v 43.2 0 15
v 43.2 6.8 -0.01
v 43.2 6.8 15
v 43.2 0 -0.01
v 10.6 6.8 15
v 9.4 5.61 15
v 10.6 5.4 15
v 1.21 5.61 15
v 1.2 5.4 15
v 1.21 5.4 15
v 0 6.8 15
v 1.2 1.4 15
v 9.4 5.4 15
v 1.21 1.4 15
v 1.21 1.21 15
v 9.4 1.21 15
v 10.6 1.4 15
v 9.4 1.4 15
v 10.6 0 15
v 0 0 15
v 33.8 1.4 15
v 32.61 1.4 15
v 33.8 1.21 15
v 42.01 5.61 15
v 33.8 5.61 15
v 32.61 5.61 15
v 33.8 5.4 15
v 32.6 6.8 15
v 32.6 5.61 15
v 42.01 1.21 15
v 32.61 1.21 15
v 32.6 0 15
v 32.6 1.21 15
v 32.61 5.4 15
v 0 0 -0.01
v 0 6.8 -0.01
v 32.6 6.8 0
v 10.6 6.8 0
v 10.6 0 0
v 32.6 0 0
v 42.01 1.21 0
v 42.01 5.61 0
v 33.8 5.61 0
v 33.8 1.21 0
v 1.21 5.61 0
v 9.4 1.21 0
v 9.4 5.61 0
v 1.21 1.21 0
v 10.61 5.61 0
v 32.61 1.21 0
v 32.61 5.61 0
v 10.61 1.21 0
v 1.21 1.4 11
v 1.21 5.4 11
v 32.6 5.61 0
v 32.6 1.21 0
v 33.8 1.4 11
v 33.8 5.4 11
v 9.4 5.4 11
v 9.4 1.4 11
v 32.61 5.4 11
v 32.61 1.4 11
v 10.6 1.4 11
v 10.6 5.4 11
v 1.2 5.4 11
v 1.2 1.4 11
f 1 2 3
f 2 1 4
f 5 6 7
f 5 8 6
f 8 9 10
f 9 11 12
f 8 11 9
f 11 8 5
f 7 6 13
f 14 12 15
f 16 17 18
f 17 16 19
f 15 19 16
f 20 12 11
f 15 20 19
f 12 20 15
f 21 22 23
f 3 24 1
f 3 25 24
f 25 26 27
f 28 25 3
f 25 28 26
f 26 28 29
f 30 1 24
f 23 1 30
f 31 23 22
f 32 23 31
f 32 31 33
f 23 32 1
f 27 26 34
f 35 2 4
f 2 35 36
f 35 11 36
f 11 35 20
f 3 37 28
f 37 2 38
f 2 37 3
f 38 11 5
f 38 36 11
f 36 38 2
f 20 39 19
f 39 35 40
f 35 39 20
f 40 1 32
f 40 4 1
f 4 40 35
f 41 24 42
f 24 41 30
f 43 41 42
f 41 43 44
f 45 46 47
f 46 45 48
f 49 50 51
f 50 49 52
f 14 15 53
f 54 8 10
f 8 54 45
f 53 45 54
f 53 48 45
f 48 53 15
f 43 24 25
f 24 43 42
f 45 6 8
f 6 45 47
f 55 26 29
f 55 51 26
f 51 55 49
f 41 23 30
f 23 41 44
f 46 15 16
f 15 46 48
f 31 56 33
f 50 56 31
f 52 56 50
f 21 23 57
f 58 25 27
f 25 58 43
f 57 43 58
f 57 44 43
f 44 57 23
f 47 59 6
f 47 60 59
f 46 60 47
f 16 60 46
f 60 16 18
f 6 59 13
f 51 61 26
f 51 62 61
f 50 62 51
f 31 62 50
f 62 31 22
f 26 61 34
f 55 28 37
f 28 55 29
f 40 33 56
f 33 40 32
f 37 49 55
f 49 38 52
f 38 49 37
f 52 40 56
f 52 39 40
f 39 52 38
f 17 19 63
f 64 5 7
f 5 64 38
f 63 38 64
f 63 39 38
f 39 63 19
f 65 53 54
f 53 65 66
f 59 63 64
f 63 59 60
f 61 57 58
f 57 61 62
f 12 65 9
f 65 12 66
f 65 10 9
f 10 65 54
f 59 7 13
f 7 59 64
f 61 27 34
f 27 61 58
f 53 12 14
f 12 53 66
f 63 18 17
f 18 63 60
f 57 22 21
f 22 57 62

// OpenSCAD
// file: ../Base/Boxes.scad
// Fischertechnik Box Foundation
// Pre-designed Boxes

use <Constants.scad>

include <PlacementOptions.scad>

box190Width = 190;
box190Depth = 130;
box130Width = 130;
box130Depth = 95;

// Values are from an original ec3 box
topBottomDifference = 1.5;
outerHeight = 40;
innerHeight = 38.2;
baseThickness = outerHeight - innerHeight;
stackExcess = 5.7;
radius = 3.5;
wallThickness = 1.5;
tolerance = 0.2;
stackOffset = innerHeight - stackExcess;

boxUsageHeight = stackOffset;
boxWallThickness = wallThickness;
boxBaseThickness = baseThickness;
boxWebWidth = 3.0;

// getBoxWallThickness()
// Gets the wall thickness of a Fischertechnik Box
function getBoxWallThickness() = boxWallThickness;

// getBoxUsageHeight()
// Gets the usable height of a Fischertechnik box
function getBoxUsageHeight() = boxUsageHeight;

// getBoxInnerHeight()
// Gets the inner height of a Fischertechnik box, including the stack excess
function getBoxInnerHeight() = innerHeight;

// getBoxBaseThickness()
// Gets the thickness of the Fischertechnik box base.
function getBoxBaseThickness() = boxBaseThickness;

// getBoxWebWidth()
// Gets the width of a box web
function getBoxWebWidth() = boxWebWidth;

// getBox190Space()
// Gets the usable inner space of a Box 190 as an x/y-list
function getBox190Space() = [
    box190Width - 2*getBoxWallThickness() - topBottomDifference, 
    box190Depth - 2*getBoxWallThickness() - topBottomDifference ];

// RoundedCornerPlate(width, depth, height, radius)
// Creates a body plate with rounded corners for a box. Used
// also to create the complete box with the hull module.
// width = Width of the plate
// depth = depth of the plate 
// height = thickness of the plate
// radius = radius of the rounded corner
module RoundedCornerPlate(width, depth, height, radius) {
    translate([radius, radius])
    hull() {
        w = width-2*radius;
        d = depth-2*radius;
        cube([w, d, height]);
        cylinder(height, r=radius, $fn=getFragments());
        translate([w, 0])
            cylinder(height, r=radius, $fn=getFragments());
        translate([w, d])
            cylinder(height, r=radius, $fn=getFragments());
        translate([0, d])
            cylinder(height, r=radius, $fn=getFragments());
    }
}

// BoxBase(width, depth)
// Creates an empty stackable Fischertechnik compatible box
// width = Outer width of the box (190, 130, ...)
// depth = Outer depth of the box (130, 95, ...)

module BoxBase(width, depth, height=outerHeight) {    
    thinPlate = 0.01;

    innerHeight = height - baseThickness;    
    
    module Body(tolerance=tolerance) {
        hull() {
            // Bottom with tolerance to fit into the original boxes when stacked
            translate([-wallThickness+tolerance, -wallThickness+tolerance, -baseThickness])
                RoundedCornerPlate(width-topBottomDifference-2*tolerance, depth-topBottomDifference-2*tolerance, thinPlate, radius);
            
            // Top
            translate([-wallThickness-topBottomDifference/2, -wallThickness-topBottomDifference/2, innerHeight-thinPlate])
                RoundedCornerPlate(width, depth, thinPlate, radius);
         }
    }

    module Cutoff() {
        hull() {
            coWidth = width - 2*wallThickness;
            coDepth = depth - 2*wallThickness;
            
            // Bottom
            RoundedCornerPlate(coWidth-topBottomDifference, coDepth-topBottomDifference, thinPlate, radius);

            // Top
            translate([-topBottomDifference/2, -topBottomDifference/2, innerHeight+thinPlate]) 
                RoundedCornerPlate(coWidth, coDepth, thinPlate, radius);
        }
    }
    
    difference() {        
        Body();
        Cutoff();
        stackOffset = innerHeight - stackExcess;
        translate([0, 0, stackOffset + baseThickness])
            Body(tolerance=0);
    }
}

// Creates the Fischertechnik empty box 130x190 mm and places it at position 0,0
// 190x130 are the outer sizes, the inner space is slightly smaller. Use getBox190Space() to get the inner sizes.
// The box is positioned that the usable inner space is at the 0,0,0 position.

module Box190() {
    BoxBase(box190Width, box190Depth);
}

// Gets the usable inner space of a Box 130 as an x/y-list
function getBox130Space() = [
    box130Width - 2*getBoxWallThickness() - topBottomDifference, 
    box130Depth - 2*getBoxWallThickness() - topBottomDifference ];

// Creates the Fischertechnik empty box 95x130 mm and places it at position 0,0
// 190x130 are the outer sizes, the inner space is slightly smaller. Use getBox190Space() to get the inner sizes.
// The box is positioned that the usable inner space is at the 0,0,0 position.

module Box130() {
    BoxBase(box130Width, box130Depth);
}

// Creates a web at the specified box walls
// corner 0 = LowerLeft, 1 = UpperLeft, 2 = UpperRight, 3 = LowerRight
// side 0 = LeftOfCorner, 1 = RightOfCorner
// distance = Distance in mm from the corner
// boxSpace = inner width and depth of the box (default: Box 190)
// webWidth = length of the web (default is 3 mms)
// webThickness = thickness of the web (default is 1 mm)

module BoxWeb(corner, side, distance, boxSpace=getBox190Space(), webWidth=getBoxWebWidth(), webThickness=1.0) {
    sink = getBoxWallThickness()/2;

    width = (corner % 2 == 0) ? 
            (side == LeftOfCorner ? webWidth : webThickness) :
            (side == LeftOfCorner ? webThickness : webWidth);

    depth = (corner % 2 == 0) ? 
            (side == RightOfCorner ? webWidth : webThickness) :
            (side == RightOfCorner ? webThickness : webWidth);
    
    xDiff = corner == LowerLeft ? 
                (side == LeftOfCorner ? -sink : distance) :
            (corner == UpperLeft ?                
                (side == LeftOfCorner ? distance : -sink) :
            (corner == UpperRight ?
                (side == LeftOfCorner ? boxSpace.x-webWidth+sink : boxSpace.x-distance-webThickness) :
                (side == LeftOfCorner ? boxSpace.x-distance-webThickness: boxSpace.x-webWidth+sink)));

    yDiff = corner == LowerLeft ? 
                (side == RightOfCorner ? -sink : distance) :
            (corner == UpperLeft ?
                (side == RightOfCorner ? boxSpace.y-distance : boxSpace.y-webWidth+sink) :
            (corner == UpperRight ?
                (side == RightOfCorner ? boxSpace.y-webWidth+sink : boxSpace.y-distance) :
                (side == RightOfCorner ? distance : -sink)));
    
    translate([xDiff, yDiff, -getExcess()])
        cube([width, depth, boxUsageHeight + 2*getExcess()]);
}
// file: ../Base/Rotation.scad
// Fischertechnik Box Foundation
// Geometry Helpers Rotation

include <PlacementOptions.scad>

// getRotatedSpace(space, rotation=NoRotation)
// Rotates the space dependent on the specified rotation

function getRotatedSpace(space, rotation=NoRotation) = [
    (rotation == Rotate90 || rotation == Rotate270) ? space.y : space.x,
    (rotation == Rotate90 || rotation == Rotate270) ? space.x : space.y
];

// Rotates the given space around the fixed left lower corner
// space = the space the children needs as width/depth list [width,depth]
// rotation = 0 Rotate0 degrees, 1 Rotate90 degrees, 2 Rotate180 degrees, 3 Rotate270 degrees (equivalent to -90)

module RotateFix(space, rotation=NoRotation) {
    dy = (rotation == Rotate0 || rotation == Rotate270) ? 0 :
        (rotation == Rotate90) ? space.x :
        space.y;
    dx = (rotation < Rotate180) ? 0 :
        (rotation == Rotate180) ? space.x :
        space.y;
    
    translate([dx, dy, 0])
        rotate([0, 0, rotations[rotation]])
            children();
}
// file: ../Base/Alignment.scad
// Fischertechnik Box Foundation
// Geometry Helpers Alignment

include <PlacementOptions.scad>

// getAlignedX(elementWidth, spaceWidth, align=AlignRight, offset=0)
// Gets the aligned X offset of an element with the given
// width in the given space.
// elementWidth = The width of the element to positon
// spaceWidth = The space where the element should be aligned
// align = 0 AlignLeft, 1 AlignCenter, 2 AlignRight
// offset = an optional offset from the aligned position. When
// aligned left or centered, then positive values are in X direction.
// When aligned right then positive values are in negative X direction.

function getAlignedX(elementWidth, spaceWidth, align=AlignRight, offset=0) =
    (align == AlignLeft) ?
        offset :
        ((align == AlignCenter) ?
        (spaceWidth - elementWidth)/2 + offset :
        spaceWidth - offset - elementWidth);

// getAlignedY(elementDepth, spaceDepth, align=AlignTop, offset=0)
// Gets the aligned Y offset of an element with the given
// depth in the given space.
// elementDepth = The depth of the element to positon
// spaceDepth = The space where the element should be aligned
// align = 0 AlignBottom, 1 AlignCenter, 2 AlignTop
// offset = an optional offset from the aligned position. When
// aligned bottom or centered, then positive values are in Y direction.
// When aligned top then positive values are in negative Y direction.

function getAlignedY(elementDepth, spaceDepth, align=AlignTop, offset=0) =
    (align == AlignBottom) ?
        offset :
        ((align == AlignCenter) ?
        (spaceDepth - elementDepth)/2 + offset :
        spaceDepth - offset - elementDepth);
// file: ../Base/PlacementOptions.scad
// Fischertechnik Box Foundation
// Placement Options

// Alignment
NoAlign = 0;
AlignLeft = 1;
AlignBottom = 2;
AlignCenter = 3;
AlignRight = 4;
AlignTop = 5;

// Element rotation degree steps
rotations = [0, -90, -180, -270];

// Rotation
NoRotation = 0;
Rotate0 = 0;
Rotate90 = 1;
Rotate180 = 2;
Rotate270 = 3;

// Docking (seen from above)
NoDock = -1;
DockLeft = 0;
DockTop = 1;
DockRight = 2;
DockCorner = 2;
DockBottom = 3;

// Web corners
LowerLeft = 0;
UpperLeft = 1;
UpperRight = 2;
LowerRight = 3;

// Web position relative to corner
LeftOfCorner = 0;
RightOfCorner = 1;
// file: ../Base/Placement.scad
// Fischertechnik Box Foundation
// Geometry Helpers Placement

use <Constants.scad>
use <Alignment.scad>
use <Rotation.scad>
use <Boxes.scad>

include <PlacementOptions.scad>

// Place(x=0, y=0, elementSpace=[0,0], alignX=AlignLeft, alignY=AlignBottom, rotation=Rotate0, boxSpace=getBox190Space())
// Places the child at the specified position
// y = Y-Position. This is a relative position when an X aligment is specified.
// x = X-Position. This is a relative position when an Y aligment is specified.
// elementSpace = space of the element to be placed [x,y]
// alignX = -1=NoAlign, 0 AlignLeft, 1 AlignCenter, 3 AlignRight (elementSpace and boxSpace required!)
// alignY = -1=NoAlign, 2 AlignBottom, 1 AlignCenter, 4 AlignTop (elementSpace and boxSpace required!)
// rotation = 0 Rotate0 0 degrees, 1 Rotate90 90 degrees, 
// 2 Rotate180 180 degrees, 3 Rotate270 270 degrees (equivalent to -90)
// boxSpace = Inner space of the box where the placement occurs [x,y] - default is Box 190x130 inner space

module Place(x=0, y=0, elementSpace=[0,0], 
  alignX=AlignLeft, alignY=AlignBottom, 
  rotation=NoRotation, boxSpace=getBox190Space()) {

    module Position(x, y, space, rotation=Rotate0) {
        translate([x, y, 0])
            RotateFix(space, rotation)
                children();
    }

    space = getRotatedSpace(elementSpace, rotation);
    alignedX = getAlignedX(space.x, boxSpace.x, alignX, x);
    alignedY = getAlignedY(space.y, boxSpace.y, alignY, y);
    Position(alignedX, alignedY, elementSpace, rotation)
        children();
}

// Center(space=getBox130Space(), elementSpace=[0,0])
// space = Space where the children is centered. For cylinder use centered=true and no elementSpace.
// elementSpace = space of the element to be centered [x,y]

module Center(space=getBox190Space(), elementSpace=[0,0]) {
    Place(elementSpace=elementSpace, boxSpace=space, alignX=AlignCenter, alignY=AlignCenter)
        children();
}

// CenterHorizontal(width=0, y=0, offset=0, space=getBox130Space())
// width = Width of the element to be placed.
// y = Y position of the element
// offset = Offset from the center position (negative will be left of the center)
// space = Space where the element is placed

module CenterHorizontal(width=0, y=0, offset=0, space=getBox190Space()) {
    Place(x=offset, y=y, elementSpace=[width, 0], boxSpace=space, alignX=AlignCenter)
        children(0);
}

// CenterVertical(depth=0, x=0, offset=0, space=getBox130Space())
// depth = Depth of the element to be placed.
// x = X position of the element
// offset = Offset from the center position (negative will be down of the center)
// space = Space where the element is placed

module CenterVertical(depth=0, x=0, offset=0, space=getBox190Space()) {
    Place(x=x, y=offset, elementSpace=[0, depth], boxSpace=space, alignY=AlignCenter)
        children(0);
}

// getIsVertical(align)
// True if the specified alignment needs a vertical orientation for a divider (AlignRight, AlignLeft)

function getIsVertical(align) = (align == AlignRight || align == AlignLeft);

// getIsHorizontal(align)
// True if the specified alignment needs a horizontal orientation for a divider (AlignTop, AlignBottom)

function getIsHorizontal(align) = (align == AlignTop || align == AlignBottom);
// file: ../Base/Constants.scad
// Fischertechnik Box Foundation
// Constants

// Constant values necessary for multiple elements

// Base constants
dividerThickness = 1.2;
excess = 0.01;
fragments = 90;
tolerance = 0.8;

// Gets the thickness of a divider 
function getDividerThickness() = dividerThickness;

// Gets the excess that is used to merge walls into each other
function getExcess() = excess;

// Gets amount of fragments of a cylinder
function getFragments() = fragments;

// Gets the inner tolerance of a frame to each side
function getTolerance() = tolerance;


// Fischertechnik specific constants
axisDiameter = 4;
axisBottomDiameter = axisDiameter + 1;
axisTolerance = 0.2;

// Gets axis diameter of Fischertechnik axis
function getAxisDiameter() = axisDiameter;

// Gets axis diameter tolerance (subtracted for element axis)
function getAxisTolerance() = axisTolerance;

// Gets the axis diameter for standing axis
function getStandAxisDiameter() = getAxisDiameter() - getAxisTolerance();

// Gets axis bottom diameter for thicker part at the bottom
function getAxisBottomDiameter() = axisBottomDiameter;

standardEdgeDistance = 2.5;
standardWebDistance = 11.5;
standardCornerLength = 15;

// gets the standard distance to the wall of the box for dockable frames with webs
function getStandardEdgeDistance() = standardEdgeDistance;

// gets the standard distance of each web to the corner of the dockable frame
function getStandardWebDistance() = standardWebDistance;

// gets the standard length of the corner walls of a dockable frame
function getStandardCornerLength() = standardCornerLength;

tubeWallFactor = 0.8;

// gets the wall thickness of a tube.
function getTubeWallThickness() = tubeWallFactor * getDividerThickness();

smallPartsFrameHeight = 20;

// gets the frame height for docked small parts boxes.
function getSmallPartsFrameHeight() = smallPartsFrameHeight;

hubRingDiameter = 19.5;
hubRingLevelDiameter = 21;

// gets the diameter of a tube matching the inner ring of a wheel
function getHubRingDiameter() = hubRingDiameter;

// gets the diameter of a hub tube with a thicker diameter
function getHubRingLevelDiameter() = hubRingLevelDiameter;
// main file
// Fischertechnik Box Library
// Frame for single 40 mm Axis (with Z28)
// 31064

use <../ModelBase/Complex.scad>

length = 40;

// getFrameAxis40Space()
// Gets the width (.x) and depth (.y) of the axis frame.

function getFrameAxis40Space() = getFrameAxisSpace(length);

// FrameAxis40()
// Axis holder for a single 50 mm axis.

module FrameAxis40() {
    FrameAxis(length);
}

// Test
color("lightgray")
FrameAxis40();
